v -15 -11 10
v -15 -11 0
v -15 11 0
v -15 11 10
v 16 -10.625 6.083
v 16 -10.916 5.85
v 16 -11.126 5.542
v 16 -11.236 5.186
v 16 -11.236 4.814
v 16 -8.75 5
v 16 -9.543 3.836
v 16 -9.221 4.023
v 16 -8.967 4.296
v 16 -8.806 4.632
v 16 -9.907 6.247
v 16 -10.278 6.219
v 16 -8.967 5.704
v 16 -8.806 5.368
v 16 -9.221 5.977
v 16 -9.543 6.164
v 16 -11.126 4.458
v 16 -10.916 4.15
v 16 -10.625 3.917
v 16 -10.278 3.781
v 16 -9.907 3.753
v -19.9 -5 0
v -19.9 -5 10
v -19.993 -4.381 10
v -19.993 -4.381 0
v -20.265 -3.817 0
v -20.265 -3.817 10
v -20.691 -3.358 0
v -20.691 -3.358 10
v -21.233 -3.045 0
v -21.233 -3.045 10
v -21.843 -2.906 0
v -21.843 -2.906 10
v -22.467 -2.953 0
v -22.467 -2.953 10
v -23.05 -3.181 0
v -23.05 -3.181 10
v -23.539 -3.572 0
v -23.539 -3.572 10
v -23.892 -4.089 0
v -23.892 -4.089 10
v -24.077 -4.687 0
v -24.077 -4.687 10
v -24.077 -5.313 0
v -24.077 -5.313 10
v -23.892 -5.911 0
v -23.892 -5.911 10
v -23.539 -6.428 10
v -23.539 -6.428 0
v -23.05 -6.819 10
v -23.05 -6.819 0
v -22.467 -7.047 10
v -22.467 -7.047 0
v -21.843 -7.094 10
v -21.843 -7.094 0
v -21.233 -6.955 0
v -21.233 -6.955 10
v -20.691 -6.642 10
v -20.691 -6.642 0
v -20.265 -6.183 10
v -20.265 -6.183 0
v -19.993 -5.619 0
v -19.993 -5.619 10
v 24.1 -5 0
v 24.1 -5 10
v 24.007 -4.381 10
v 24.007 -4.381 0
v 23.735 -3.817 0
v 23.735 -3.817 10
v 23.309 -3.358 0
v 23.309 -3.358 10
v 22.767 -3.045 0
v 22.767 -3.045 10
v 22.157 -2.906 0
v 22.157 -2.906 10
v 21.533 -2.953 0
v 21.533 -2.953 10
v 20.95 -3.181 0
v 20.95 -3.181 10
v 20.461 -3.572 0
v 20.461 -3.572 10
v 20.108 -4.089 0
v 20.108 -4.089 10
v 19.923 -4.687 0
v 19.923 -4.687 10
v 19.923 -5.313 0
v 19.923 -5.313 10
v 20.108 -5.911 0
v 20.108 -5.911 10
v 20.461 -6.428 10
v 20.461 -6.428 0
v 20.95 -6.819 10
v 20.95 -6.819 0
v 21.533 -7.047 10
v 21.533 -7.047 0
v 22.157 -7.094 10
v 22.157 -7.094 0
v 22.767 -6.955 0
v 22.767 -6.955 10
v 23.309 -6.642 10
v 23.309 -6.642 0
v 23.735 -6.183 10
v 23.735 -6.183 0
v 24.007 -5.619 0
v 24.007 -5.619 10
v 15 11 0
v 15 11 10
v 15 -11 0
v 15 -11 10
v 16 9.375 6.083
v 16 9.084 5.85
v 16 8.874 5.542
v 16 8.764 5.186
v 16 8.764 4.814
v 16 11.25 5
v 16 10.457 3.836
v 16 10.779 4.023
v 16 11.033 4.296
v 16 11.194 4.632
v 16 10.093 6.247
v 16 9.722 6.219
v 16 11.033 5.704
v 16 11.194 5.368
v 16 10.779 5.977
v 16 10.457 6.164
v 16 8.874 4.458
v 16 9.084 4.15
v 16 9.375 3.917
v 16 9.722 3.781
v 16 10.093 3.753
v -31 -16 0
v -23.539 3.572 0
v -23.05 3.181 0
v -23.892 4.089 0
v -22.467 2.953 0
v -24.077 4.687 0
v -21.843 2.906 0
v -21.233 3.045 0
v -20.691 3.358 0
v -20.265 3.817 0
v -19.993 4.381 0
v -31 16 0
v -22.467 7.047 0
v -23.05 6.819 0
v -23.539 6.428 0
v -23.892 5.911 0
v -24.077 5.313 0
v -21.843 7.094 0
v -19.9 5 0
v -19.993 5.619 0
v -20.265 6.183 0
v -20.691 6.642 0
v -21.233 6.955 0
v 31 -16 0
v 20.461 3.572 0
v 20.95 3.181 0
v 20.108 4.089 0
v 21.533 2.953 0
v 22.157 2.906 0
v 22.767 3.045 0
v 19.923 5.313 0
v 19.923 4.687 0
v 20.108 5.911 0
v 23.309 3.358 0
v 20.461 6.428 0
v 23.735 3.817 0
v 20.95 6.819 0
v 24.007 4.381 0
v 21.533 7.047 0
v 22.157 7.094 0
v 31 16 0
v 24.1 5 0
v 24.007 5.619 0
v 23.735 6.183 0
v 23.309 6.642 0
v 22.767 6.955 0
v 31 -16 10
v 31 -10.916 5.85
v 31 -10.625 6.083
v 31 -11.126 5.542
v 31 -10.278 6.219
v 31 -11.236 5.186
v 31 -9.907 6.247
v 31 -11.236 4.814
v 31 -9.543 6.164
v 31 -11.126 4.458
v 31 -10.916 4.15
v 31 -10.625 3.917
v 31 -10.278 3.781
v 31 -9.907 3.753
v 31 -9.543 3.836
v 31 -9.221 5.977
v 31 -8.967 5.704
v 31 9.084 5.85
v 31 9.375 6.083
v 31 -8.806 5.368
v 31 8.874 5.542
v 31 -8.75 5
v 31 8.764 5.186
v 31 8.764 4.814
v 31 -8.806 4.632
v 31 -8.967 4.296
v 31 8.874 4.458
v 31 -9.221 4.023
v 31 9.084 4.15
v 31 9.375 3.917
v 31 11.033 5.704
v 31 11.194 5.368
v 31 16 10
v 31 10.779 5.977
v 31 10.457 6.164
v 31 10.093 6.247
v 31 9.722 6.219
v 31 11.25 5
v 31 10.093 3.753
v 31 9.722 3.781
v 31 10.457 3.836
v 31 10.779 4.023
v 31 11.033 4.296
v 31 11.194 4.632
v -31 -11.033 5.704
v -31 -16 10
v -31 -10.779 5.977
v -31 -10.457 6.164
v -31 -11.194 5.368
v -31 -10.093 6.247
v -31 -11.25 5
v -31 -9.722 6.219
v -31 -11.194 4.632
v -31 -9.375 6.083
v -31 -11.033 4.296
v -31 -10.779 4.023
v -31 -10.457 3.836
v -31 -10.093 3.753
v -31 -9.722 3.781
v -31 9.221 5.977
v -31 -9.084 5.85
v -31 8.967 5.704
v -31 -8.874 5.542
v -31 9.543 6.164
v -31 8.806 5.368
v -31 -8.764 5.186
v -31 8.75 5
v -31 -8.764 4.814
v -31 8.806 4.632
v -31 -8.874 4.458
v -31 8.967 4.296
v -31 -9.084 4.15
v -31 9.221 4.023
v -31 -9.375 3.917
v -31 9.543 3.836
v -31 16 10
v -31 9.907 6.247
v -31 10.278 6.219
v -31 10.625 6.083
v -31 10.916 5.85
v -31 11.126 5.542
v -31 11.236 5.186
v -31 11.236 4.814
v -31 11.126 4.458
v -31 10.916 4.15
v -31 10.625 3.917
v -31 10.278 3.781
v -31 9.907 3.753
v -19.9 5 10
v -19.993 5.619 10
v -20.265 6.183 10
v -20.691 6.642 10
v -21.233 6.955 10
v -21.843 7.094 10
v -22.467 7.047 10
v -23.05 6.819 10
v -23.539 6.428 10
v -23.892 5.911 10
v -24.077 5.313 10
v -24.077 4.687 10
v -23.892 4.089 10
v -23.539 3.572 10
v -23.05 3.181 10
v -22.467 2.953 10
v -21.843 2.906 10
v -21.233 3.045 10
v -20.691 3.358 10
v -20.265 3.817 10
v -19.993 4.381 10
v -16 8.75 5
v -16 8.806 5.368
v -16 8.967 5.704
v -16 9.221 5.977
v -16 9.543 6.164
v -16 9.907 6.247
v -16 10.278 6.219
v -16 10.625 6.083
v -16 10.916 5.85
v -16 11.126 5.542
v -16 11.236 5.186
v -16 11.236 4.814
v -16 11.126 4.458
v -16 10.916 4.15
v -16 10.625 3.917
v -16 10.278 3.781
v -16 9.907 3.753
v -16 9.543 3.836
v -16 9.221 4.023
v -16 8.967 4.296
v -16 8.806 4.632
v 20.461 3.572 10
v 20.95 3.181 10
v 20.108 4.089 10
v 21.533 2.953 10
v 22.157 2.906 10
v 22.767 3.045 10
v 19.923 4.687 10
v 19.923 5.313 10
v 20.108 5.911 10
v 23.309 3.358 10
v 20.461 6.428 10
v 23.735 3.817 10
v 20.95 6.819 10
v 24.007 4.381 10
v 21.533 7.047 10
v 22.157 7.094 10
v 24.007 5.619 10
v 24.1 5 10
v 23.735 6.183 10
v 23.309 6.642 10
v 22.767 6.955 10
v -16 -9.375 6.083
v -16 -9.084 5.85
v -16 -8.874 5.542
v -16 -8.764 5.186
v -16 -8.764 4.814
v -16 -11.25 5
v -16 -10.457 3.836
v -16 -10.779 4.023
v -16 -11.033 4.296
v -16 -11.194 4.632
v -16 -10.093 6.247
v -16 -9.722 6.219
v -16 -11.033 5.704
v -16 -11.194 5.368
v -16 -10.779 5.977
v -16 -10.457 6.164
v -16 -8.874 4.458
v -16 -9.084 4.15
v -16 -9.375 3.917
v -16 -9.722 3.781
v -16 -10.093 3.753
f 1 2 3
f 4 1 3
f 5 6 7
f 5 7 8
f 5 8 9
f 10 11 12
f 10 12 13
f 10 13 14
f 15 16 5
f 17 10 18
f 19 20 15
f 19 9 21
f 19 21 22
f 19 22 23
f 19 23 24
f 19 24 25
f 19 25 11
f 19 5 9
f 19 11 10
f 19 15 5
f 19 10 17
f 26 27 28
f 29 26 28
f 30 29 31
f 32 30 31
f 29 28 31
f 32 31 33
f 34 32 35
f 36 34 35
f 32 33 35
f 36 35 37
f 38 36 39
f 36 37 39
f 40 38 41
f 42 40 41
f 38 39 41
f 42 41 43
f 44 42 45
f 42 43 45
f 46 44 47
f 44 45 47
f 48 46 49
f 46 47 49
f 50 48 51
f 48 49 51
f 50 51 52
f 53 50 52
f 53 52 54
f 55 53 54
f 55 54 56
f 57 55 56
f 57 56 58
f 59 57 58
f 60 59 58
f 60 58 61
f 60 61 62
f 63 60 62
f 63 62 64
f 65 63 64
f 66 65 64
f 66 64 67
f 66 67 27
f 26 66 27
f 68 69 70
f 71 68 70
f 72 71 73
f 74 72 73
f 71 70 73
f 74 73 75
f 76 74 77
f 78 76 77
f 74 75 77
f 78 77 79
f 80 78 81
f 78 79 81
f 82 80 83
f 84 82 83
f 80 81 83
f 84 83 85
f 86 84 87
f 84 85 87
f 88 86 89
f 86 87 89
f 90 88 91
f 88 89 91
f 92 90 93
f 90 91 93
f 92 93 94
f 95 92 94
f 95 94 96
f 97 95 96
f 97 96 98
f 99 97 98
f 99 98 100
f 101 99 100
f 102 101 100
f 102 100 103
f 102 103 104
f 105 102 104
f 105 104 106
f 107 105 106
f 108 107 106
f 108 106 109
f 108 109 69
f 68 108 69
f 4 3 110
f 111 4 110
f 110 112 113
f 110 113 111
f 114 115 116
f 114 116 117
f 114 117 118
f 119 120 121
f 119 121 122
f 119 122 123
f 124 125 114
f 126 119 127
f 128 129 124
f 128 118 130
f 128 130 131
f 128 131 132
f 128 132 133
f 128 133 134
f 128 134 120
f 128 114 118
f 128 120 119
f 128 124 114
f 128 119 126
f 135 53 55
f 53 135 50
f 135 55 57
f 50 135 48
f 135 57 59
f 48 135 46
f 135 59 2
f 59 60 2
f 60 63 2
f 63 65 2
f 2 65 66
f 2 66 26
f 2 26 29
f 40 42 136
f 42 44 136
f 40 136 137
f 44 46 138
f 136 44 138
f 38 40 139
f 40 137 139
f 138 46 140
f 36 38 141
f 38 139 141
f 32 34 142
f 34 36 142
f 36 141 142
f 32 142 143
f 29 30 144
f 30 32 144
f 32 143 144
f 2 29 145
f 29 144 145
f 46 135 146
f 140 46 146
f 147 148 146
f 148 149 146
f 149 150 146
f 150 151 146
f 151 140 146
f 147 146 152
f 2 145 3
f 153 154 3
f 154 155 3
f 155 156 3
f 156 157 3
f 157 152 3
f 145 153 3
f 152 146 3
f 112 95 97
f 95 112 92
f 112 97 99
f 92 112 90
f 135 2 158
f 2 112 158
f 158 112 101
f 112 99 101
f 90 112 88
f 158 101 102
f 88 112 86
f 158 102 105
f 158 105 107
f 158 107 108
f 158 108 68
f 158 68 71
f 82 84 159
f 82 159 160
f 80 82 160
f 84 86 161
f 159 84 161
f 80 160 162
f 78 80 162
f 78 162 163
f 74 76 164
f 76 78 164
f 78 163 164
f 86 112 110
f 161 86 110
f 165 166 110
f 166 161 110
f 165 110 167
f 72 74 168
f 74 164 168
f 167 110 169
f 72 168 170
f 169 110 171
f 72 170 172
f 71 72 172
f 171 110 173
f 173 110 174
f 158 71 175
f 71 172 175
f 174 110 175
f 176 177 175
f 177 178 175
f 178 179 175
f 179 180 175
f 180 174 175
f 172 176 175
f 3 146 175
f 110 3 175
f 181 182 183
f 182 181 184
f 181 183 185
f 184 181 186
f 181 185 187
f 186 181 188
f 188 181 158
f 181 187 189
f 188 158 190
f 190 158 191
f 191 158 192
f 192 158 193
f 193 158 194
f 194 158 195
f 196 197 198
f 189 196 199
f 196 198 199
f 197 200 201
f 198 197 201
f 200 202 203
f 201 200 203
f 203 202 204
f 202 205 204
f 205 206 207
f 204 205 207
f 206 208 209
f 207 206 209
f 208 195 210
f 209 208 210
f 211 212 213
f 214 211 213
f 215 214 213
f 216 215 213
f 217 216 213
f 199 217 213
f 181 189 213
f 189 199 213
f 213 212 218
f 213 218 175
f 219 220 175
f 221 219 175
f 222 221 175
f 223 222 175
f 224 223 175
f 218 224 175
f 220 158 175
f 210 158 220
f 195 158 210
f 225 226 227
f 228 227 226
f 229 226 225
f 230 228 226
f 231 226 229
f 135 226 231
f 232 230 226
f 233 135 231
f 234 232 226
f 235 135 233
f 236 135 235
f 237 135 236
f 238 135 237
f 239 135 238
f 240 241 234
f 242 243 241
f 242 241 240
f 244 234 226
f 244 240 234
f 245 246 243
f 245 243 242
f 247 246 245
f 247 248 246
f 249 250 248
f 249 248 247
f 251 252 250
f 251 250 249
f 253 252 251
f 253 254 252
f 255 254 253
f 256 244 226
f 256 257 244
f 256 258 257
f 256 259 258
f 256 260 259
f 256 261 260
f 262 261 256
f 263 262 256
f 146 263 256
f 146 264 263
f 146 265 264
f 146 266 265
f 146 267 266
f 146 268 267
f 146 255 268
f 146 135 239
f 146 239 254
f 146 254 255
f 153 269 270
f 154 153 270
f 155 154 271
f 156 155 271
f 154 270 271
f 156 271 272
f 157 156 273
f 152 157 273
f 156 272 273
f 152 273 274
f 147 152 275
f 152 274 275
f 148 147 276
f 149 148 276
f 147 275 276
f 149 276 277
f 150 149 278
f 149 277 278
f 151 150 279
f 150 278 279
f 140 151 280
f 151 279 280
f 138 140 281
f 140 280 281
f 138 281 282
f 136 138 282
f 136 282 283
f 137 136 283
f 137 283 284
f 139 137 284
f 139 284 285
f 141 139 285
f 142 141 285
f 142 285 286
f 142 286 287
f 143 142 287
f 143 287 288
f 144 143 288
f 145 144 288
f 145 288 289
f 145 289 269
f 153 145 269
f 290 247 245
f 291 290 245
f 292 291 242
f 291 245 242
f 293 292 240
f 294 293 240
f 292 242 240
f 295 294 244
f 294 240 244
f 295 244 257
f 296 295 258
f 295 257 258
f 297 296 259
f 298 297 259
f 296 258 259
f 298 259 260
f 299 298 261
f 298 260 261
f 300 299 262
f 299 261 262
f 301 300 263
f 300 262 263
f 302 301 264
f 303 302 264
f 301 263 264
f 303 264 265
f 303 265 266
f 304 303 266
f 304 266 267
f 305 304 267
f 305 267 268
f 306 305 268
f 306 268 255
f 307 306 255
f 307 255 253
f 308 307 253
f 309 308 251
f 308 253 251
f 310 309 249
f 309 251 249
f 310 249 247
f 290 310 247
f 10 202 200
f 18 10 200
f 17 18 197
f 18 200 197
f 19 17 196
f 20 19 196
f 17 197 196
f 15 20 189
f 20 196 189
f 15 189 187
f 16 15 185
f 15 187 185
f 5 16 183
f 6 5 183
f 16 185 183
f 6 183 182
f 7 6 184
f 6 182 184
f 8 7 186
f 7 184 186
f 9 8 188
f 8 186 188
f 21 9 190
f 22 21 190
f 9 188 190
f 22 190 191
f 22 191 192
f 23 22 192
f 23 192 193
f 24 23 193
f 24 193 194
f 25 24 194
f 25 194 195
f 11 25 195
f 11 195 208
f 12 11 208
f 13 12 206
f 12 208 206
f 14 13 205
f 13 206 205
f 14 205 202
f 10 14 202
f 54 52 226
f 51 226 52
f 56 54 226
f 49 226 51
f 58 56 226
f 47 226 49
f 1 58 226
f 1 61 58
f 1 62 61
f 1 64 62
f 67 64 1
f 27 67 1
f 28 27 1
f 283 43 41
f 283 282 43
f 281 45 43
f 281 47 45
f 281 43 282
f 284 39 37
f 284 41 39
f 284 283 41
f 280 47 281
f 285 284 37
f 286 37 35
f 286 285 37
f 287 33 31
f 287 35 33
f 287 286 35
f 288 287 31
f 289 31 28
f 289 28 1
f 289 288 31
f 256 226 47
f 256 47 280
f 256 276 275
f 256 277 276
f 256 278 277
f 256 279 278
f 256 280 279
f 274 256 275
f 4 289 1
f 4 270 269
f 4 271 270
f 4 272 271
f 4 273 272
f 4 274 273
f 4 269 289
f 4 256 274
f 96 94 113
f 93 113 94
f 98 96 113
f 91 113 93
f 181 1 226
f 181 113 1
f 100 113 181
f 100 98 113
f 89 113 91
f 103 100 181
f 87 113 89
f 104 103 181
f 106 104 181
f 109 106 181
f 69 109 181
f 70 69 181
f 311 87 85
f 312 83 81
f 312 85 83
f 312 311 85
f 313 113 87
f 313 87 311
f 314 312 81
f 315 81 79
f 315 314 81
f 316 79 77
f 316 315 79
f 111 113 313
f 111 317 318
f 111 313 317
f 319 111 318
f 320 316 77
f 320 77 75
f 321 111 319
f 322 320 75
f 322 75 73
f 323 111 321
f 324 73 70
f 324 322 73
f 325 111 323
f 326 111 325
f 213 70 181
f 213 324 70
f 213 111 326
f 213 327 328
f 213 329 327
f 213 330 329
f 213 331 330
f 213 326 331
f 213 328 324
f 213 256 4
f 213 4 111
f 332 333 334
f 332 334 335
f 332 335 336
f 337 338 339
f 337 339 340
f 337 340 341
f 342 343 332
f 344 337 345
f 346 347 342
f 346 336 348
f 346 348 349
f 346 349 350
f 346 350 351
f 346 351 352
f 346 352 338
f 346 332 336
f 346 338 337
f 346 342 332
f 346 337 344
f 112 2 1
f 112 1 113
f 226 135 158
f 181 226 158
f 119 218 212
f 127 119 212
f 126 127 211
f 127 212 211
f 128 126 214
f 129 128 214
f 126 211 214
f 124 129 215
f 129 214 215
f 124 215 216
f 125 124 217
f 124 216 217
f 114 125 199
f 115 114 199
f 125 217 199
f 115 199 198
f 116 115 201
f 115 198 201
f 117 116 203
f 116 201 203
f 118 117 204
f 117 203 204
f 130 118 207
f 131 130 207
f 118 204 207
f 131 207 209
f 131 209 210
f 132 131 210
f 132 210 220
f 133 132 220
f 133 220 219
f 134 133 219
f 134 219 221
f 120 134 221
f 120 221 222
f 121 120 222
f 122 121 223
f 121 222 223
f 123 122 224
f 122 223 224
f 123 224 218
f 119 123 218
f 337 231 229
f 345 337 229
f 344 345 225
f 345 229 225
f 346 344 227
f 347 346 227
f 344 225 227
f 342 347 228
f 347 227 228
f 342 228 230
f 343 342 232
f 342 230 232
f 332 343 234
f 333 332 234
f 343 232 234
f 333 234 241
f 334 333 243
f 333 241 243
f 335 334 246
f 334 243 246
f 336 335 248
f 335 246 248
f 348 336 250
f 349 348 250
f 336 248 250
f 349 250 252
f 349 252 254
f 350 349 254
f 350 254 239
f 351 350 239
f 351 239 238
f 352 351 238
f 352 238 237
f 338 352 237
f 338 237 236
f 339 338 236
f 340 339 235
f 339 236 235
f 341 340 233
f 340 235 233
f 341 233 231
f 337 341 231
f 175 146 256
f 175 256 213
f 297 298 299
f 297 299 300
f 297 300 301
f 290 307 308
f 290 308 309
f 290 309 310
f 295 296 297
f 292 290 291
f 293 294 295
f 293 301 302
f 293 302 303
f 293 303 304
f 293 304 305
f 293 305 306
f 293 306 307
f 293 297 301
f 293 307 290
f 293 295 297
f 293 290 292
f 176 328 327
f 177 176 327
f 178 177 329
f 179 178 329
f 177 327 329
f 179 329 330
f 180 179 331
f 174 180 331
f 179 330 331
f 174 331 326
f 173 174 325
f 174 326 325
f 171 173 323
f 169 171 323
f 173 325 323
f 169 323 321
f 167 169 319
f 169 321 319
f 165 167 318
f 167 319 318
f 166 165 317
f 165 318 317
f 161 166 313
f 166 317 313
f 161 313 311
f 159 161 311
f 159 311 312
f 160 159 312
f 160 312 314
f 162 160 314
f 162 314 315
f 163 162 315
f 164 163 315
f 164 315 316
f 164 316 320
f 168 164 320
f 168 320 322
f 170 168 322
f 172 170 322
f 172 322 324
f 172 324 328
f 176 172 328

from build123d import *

# Parameters (mm, degrees)
F0_W     = 62
F0_H     = 32
F0_W_2   = 30
F0_H_2   = 22
F1_DEPTH = 10
F2_R     = 2.1
F3_DEPTH = 10.001
F4_R     = 1.25
F5_DEPTH = 15
F6_R     = 1.25
F7_DEPTH = 15


with BuildPart() as f1:
    # F0 (on Top) → F1 (new body)
    with BuildSketch(Plane.XY):
        Rectangle(F0_W, F0_H)
        Rectangle(F0_W_2, F0_H_2, mode=Mode.SUBTRACT)
    extrude(amount=F1_DEPTH)

    # F2 (on face) → F3 (cut, through all)
    with BuildSketch(Plane.XY.offset(10)):
        with Locations((-22, 5)):
            Circle(F2_R)
        with Locations((-22, -5)):
            Circle(F2_R)
        with Locations((22, 5)):
            Circle(F2_R)
        with Locations((22, -5)):
            Circle(F2_R)
    extrude(amount=-F3_DEPTH, mode=Mode.SUBTRACT)

    # F4 (on face) → F5 (cut)
    with BuildSketch(Plane(origin=(-31, 0, 0), x_dir=(0, -1, 0), z_dir=(-1, 0, 0))):
        with Locations((10, 5)):
            Circle(F4_R)
        with Locations((-10, 5)):
            Circle(F4_R)
    extrude(amount=-F5_DEPTH, mode=Mode.SUBTRACT)

    # F6 (on face) → F7 (cut)
    with BuildSketch(Plane.YZ.offset(31)):
        with Locations((-10, 5)):
            Circle(F6_R)
        with Locations((10, 5)):
            Circle(F6_R)
    extrude(amount=-F7_DEPTH, mode=Mode.SUBTRACT)


solid = f1.part
